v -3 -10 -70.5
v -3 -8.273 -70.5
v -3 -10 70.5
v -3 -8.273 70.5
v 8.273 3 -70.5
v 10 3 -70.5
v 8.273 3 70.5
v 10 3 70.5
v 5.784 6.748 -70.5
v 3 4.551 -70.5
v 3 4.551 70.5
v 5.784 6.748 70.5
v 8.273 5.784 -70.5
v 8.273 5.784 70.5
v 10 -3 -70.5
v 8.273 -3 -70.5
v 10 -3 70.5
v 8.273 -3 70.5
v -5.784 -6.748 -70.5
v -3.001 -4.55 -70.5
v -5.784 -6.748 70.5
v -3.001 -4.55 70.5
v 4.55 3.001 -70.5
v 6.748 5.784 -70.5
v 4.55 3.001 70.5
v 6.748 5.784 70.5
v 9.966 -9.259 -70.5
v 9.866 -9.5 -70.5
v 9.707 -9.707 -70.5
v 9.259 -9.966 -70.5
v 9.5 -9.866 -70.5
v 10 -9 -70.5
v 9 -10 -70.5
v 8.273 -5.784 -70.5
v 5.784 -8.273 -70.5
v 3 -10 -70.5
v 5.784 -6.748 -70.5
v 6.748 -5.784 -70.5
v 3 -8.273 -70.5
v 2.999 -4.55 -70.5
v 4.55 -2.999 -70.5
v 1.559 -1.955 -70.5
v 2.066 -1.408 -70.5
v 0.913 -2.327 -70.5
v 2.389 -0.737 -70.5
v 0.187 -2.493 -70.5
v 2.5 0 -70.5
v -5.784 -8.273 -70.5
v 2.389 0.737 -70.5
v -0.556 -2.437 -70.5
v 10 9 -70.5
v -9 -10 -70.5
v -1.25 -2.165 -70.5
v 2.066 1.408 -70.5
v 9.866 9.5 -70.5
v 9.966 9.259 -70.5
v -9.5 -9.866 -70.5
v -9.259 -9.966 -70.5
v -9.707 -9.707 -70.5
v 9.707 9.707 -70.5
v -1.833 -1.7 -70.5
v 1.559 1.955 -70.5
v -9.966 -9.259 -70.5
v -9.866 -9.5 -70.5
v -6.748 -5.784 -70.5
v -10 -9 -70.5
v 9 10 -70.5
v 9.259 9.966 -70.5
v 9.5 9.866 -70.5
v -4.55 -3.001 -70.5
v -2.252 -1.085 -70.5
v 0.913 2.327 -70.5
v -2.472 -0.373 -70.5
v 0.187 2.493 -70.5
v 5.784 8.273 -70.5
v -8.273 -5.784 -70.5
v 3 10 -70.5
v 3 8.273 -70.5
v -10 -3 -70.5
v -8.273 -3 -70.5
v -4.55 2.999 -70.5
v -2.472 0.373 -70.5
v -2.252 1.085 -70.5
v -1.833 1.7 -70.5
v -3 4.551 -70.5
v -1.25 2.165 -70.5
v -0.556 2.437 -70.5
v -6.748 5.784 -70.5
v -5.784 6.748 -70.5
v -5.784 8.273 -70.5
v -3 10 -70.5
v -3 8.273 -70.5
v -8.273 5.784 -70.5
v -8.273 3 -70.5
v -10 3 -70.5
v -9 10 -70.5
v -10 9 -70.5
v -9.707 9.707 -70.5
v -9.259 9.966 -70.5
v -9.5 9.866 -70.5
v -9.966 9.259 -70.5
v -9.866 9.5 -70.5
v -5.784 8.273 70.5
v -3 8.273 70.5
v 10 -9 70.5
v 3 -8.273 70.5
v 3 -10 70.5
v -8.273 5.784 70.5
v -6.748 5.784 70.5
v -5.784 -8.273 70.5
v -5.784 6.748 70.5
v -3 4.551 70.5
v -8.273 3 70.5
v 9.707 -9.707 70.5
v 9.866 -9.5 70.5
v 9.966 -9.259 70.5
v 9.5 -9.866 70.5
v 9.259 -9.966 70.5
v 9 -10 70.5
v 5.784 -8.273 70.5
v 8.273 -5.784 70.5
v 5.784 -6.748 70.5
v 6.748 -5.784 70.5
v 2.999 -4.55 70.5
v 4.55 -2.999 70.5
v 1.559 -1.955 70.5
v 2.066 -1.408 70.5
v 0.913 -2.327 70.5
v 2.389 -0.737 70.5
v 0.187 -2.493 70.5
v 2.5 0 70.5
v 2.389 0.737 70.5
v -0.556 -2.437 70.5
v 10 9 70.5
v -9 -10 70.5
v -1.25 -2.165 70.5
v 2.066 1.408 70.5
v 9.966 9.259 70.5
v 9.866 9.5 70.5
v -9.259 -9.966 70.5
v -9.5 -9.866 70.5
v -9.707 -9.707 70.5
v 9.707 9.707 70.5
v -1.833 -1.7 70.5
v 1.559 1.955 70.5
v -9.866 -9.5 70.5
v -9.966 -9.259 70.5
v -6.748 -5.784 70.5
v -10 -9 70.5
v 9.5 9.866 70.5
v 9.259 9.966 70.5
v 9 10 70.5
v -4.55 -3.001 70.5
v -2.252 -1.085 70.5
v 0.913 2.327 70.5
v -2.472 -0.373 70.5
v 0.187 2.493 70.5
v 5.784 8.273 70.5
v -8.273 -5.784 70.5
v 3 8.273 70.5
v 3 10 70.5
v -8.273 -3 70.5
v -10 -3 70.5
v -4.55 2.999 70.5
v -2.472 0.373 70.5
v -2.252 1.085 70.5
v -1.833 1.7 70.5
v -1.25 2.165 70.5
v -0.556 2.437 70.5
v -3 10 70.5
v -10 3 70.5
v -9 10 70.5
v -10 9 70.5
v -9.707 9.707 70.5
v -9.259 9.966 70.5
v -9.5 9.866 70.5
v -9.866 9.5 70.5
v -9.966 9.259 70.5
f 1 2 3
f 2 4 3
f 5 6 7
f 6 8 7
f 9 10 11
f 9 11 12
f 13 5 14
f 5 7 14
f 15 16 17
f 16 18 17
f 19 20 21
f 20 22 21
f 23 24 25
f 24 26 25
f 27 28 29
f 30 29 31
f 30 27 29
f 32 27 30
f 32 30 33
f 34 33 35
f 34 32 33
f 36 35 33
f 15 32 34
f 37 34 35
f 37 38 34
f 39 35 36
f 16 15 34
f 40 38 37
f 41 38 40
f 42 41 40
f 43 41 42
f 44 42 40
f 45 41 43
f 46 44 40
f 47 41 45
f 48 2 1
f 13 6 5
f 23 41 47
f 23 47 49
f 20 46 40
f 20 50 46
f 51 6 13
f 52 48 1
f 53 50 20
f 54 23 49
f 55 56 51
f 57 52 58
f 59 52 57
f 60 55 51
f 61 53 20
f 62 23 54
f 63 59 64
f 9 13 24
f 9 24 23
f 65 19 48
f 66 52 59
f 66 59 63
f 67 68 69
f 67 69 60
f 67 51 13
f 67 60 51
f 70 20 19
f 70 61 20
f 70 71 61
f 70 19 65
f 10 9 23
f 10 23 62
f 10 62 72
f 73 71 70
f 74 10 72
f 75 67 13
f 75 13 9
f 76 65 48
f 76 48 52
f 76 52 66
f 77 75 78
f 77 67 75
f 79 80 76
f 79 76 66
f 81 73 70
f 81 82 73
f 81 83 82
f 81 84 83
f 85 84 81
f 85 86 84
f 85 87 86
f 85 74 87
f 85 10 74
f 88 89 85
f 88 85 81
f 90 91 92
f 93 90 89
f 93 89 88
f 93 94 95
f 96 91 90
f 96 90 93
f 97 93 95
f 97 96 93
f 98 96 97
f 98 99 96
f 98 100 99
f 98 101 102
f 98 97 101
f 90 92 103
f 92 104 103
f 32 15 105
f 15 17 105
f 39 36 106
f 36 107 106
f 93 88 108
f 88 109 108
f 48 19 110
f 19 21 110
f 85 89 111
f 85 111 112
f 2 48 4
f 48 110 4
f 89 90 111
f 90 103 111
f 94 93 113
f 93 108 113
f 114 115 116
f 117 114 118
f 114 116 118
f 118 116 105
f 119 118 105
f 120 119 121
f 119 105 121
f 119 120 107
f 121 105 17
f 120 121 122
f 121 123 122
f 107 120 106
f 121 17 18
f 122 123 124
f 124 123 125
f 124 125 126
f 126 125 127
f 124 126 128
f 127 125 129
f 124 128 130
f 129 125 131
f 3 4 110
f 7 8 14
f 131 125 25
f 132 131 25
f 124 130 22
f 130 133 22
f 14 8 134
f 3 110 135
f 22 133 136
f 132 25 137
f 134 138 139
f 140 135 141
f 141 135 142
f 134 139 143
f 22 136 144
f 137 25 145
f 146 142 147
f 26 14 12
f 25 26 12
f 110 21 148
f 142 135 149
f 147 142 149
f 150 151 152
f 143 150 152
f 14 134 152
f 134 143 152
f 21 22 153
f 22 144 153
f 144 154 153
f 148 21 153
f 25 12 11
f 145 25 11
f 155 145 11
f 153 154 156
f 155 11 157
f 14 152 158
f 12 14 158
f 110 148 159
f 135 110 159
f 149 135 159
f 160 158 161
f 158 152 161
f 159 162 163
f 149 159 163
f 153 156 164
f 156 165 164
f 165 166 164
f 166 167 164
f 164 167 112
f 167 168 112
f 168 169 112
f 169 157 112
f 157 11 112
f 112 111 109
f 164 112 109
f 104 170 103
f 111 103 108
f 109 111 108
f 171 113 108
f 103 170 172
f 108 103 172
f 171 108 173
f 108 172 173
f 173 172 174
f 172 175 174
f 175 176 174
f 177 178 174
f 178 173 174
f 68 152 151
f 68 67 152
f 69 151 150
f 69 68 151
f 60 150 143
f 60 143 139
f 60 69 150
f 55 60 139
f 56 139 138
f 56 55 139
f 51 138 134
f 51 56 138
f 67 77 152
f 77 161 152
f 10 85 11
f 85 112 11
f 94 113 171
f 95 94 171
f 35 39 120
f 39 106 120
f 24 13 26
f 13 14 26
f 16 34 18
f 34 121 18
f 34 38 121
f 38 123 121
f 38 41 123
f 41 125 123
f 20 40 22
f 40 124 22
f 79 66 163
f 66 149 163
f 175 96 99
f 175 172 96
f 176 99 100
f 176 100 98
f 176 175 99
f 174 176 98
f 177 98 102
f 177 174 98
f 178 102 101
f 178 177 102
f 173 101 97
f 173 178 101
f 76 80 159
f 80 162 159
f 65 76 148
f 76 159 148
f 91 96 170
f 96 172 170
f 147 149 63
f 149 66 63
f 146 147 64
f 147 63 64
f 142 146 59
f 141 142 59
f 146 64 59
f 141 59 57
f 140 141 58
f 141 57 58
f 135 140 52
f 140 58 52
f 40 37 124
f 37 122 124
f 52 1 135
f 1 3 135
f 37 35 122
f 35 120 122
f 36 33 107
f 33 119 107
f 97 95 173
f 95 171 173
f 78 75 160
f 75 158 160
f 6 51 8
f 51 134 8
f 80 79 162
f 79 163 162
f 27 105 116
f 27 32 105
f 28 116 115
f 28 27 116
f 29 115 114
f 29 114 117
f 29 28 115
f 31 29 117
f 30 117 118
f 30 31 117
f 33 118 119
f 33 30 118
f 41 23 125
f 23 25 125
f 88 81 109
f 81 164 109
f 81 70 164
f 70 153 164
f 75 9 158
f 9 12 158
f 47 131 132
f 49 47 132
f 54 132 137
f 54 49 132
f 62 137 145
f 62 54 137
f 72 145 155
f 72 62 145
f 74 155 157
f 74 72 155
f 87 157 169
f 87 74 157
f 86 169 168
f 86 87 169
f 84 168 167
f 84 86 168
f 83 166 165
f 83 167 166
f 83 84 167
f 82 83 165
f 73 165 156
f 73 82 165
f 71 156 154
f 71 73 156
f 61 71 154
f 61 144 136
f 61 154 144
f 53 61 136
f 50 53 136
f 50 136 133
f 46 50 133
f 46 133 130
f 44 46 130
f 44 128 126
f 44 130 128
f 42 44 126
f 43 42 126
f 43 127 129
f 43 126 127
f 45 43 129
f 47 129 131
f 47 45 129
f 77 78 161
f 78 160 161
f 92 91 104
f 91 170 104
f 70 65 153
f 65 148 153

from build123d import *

# Parameters (mm, degrees)
BOSS_EXTRUDE1_DEPTH     = 70.5
CUT_EXTRUDE1_DEPTH      = 142.707445111
CUT_EXTRUDE1_DEPTH_BACK = 142.707445111
SKETCH2_R               = 2.5
FILLET1_R               = 1


with BuildPart() as part:
    # Sketch1 → Boss-Extrude1 (new, symmetric)
    with BuildSketch(Plane.XY):
        Polygon((-10, 10), (-3, 10), (-3, 8.272610059), (-5.783778863, 8.272610059), (-5.783778863, 6.747994248), (-3, 4.550753814), (3, 4.550753814), (5.783778863, 6.747994248), (5.783778863, 8.272610059), (3, 8.272610059), (3, 10), (10, 10), (10, 3), (8.272610059, 3), (8.272610059, 5.783778863), (6.747994248, 5.783778863), (4.55, 3.000595152), (4.55, -2.999404848), (6.747994248, -5.783778863), (8.272610059, -5.783778863), (8.272610059, -3), (10, -3), (10, -10), (3, -10), (3, -8.272610059), (5.783778863, -8.272610059), (5.783778863, -6.747994248), (2.999404848, -4.55), (-3.000595152, -4.55), (-5.783778863, -6.747994248), (-5.783778863, -8.272610059), (-3, -8.272610059), (-3, -10), (-10, -10), (-10, -3), (-8.272610059, -3), (-8.272610059, -5.783778863), (-6.747994248, -5.783778863), (-4.55, -3.000595152), (-4.55, 2.999404848), (-6.747994248, 5.783778863), (-8.272610059, 5.783778863), (-8.272610059, 3), (-10, 3), align=None)
    extrude(amount=BOSS_EXTRUDE1_DEPTH, both=True)

    # Sketch2 → Cut-Extrude1 (cut, two sides: drawn at the far end of the back side and taken through both)
    with BuildSketch(Plane.XY.offset(70.5).offset(-CUT_EXTRUDE1_DEPTH_BACK)):
        Circle(SKETCH2_R)
    extrude(amount=CUT_EXTRUDE1_DEPTH + CUT_EXTRUDE1_DEPTH_BACK, mode=Mode.SUBTRACT)

    # Fillet1
    fillet1_edges = [part.edges().sort_by_distance(p)[0] for p in [
        (-10, 10, 0),
        (10, 10, 0),
        (10, -10, 0),
        (-10, -10, 0),
    ]]
    fillet(fillet1_edges, radius=FILLET1_R)


solid = part.part
